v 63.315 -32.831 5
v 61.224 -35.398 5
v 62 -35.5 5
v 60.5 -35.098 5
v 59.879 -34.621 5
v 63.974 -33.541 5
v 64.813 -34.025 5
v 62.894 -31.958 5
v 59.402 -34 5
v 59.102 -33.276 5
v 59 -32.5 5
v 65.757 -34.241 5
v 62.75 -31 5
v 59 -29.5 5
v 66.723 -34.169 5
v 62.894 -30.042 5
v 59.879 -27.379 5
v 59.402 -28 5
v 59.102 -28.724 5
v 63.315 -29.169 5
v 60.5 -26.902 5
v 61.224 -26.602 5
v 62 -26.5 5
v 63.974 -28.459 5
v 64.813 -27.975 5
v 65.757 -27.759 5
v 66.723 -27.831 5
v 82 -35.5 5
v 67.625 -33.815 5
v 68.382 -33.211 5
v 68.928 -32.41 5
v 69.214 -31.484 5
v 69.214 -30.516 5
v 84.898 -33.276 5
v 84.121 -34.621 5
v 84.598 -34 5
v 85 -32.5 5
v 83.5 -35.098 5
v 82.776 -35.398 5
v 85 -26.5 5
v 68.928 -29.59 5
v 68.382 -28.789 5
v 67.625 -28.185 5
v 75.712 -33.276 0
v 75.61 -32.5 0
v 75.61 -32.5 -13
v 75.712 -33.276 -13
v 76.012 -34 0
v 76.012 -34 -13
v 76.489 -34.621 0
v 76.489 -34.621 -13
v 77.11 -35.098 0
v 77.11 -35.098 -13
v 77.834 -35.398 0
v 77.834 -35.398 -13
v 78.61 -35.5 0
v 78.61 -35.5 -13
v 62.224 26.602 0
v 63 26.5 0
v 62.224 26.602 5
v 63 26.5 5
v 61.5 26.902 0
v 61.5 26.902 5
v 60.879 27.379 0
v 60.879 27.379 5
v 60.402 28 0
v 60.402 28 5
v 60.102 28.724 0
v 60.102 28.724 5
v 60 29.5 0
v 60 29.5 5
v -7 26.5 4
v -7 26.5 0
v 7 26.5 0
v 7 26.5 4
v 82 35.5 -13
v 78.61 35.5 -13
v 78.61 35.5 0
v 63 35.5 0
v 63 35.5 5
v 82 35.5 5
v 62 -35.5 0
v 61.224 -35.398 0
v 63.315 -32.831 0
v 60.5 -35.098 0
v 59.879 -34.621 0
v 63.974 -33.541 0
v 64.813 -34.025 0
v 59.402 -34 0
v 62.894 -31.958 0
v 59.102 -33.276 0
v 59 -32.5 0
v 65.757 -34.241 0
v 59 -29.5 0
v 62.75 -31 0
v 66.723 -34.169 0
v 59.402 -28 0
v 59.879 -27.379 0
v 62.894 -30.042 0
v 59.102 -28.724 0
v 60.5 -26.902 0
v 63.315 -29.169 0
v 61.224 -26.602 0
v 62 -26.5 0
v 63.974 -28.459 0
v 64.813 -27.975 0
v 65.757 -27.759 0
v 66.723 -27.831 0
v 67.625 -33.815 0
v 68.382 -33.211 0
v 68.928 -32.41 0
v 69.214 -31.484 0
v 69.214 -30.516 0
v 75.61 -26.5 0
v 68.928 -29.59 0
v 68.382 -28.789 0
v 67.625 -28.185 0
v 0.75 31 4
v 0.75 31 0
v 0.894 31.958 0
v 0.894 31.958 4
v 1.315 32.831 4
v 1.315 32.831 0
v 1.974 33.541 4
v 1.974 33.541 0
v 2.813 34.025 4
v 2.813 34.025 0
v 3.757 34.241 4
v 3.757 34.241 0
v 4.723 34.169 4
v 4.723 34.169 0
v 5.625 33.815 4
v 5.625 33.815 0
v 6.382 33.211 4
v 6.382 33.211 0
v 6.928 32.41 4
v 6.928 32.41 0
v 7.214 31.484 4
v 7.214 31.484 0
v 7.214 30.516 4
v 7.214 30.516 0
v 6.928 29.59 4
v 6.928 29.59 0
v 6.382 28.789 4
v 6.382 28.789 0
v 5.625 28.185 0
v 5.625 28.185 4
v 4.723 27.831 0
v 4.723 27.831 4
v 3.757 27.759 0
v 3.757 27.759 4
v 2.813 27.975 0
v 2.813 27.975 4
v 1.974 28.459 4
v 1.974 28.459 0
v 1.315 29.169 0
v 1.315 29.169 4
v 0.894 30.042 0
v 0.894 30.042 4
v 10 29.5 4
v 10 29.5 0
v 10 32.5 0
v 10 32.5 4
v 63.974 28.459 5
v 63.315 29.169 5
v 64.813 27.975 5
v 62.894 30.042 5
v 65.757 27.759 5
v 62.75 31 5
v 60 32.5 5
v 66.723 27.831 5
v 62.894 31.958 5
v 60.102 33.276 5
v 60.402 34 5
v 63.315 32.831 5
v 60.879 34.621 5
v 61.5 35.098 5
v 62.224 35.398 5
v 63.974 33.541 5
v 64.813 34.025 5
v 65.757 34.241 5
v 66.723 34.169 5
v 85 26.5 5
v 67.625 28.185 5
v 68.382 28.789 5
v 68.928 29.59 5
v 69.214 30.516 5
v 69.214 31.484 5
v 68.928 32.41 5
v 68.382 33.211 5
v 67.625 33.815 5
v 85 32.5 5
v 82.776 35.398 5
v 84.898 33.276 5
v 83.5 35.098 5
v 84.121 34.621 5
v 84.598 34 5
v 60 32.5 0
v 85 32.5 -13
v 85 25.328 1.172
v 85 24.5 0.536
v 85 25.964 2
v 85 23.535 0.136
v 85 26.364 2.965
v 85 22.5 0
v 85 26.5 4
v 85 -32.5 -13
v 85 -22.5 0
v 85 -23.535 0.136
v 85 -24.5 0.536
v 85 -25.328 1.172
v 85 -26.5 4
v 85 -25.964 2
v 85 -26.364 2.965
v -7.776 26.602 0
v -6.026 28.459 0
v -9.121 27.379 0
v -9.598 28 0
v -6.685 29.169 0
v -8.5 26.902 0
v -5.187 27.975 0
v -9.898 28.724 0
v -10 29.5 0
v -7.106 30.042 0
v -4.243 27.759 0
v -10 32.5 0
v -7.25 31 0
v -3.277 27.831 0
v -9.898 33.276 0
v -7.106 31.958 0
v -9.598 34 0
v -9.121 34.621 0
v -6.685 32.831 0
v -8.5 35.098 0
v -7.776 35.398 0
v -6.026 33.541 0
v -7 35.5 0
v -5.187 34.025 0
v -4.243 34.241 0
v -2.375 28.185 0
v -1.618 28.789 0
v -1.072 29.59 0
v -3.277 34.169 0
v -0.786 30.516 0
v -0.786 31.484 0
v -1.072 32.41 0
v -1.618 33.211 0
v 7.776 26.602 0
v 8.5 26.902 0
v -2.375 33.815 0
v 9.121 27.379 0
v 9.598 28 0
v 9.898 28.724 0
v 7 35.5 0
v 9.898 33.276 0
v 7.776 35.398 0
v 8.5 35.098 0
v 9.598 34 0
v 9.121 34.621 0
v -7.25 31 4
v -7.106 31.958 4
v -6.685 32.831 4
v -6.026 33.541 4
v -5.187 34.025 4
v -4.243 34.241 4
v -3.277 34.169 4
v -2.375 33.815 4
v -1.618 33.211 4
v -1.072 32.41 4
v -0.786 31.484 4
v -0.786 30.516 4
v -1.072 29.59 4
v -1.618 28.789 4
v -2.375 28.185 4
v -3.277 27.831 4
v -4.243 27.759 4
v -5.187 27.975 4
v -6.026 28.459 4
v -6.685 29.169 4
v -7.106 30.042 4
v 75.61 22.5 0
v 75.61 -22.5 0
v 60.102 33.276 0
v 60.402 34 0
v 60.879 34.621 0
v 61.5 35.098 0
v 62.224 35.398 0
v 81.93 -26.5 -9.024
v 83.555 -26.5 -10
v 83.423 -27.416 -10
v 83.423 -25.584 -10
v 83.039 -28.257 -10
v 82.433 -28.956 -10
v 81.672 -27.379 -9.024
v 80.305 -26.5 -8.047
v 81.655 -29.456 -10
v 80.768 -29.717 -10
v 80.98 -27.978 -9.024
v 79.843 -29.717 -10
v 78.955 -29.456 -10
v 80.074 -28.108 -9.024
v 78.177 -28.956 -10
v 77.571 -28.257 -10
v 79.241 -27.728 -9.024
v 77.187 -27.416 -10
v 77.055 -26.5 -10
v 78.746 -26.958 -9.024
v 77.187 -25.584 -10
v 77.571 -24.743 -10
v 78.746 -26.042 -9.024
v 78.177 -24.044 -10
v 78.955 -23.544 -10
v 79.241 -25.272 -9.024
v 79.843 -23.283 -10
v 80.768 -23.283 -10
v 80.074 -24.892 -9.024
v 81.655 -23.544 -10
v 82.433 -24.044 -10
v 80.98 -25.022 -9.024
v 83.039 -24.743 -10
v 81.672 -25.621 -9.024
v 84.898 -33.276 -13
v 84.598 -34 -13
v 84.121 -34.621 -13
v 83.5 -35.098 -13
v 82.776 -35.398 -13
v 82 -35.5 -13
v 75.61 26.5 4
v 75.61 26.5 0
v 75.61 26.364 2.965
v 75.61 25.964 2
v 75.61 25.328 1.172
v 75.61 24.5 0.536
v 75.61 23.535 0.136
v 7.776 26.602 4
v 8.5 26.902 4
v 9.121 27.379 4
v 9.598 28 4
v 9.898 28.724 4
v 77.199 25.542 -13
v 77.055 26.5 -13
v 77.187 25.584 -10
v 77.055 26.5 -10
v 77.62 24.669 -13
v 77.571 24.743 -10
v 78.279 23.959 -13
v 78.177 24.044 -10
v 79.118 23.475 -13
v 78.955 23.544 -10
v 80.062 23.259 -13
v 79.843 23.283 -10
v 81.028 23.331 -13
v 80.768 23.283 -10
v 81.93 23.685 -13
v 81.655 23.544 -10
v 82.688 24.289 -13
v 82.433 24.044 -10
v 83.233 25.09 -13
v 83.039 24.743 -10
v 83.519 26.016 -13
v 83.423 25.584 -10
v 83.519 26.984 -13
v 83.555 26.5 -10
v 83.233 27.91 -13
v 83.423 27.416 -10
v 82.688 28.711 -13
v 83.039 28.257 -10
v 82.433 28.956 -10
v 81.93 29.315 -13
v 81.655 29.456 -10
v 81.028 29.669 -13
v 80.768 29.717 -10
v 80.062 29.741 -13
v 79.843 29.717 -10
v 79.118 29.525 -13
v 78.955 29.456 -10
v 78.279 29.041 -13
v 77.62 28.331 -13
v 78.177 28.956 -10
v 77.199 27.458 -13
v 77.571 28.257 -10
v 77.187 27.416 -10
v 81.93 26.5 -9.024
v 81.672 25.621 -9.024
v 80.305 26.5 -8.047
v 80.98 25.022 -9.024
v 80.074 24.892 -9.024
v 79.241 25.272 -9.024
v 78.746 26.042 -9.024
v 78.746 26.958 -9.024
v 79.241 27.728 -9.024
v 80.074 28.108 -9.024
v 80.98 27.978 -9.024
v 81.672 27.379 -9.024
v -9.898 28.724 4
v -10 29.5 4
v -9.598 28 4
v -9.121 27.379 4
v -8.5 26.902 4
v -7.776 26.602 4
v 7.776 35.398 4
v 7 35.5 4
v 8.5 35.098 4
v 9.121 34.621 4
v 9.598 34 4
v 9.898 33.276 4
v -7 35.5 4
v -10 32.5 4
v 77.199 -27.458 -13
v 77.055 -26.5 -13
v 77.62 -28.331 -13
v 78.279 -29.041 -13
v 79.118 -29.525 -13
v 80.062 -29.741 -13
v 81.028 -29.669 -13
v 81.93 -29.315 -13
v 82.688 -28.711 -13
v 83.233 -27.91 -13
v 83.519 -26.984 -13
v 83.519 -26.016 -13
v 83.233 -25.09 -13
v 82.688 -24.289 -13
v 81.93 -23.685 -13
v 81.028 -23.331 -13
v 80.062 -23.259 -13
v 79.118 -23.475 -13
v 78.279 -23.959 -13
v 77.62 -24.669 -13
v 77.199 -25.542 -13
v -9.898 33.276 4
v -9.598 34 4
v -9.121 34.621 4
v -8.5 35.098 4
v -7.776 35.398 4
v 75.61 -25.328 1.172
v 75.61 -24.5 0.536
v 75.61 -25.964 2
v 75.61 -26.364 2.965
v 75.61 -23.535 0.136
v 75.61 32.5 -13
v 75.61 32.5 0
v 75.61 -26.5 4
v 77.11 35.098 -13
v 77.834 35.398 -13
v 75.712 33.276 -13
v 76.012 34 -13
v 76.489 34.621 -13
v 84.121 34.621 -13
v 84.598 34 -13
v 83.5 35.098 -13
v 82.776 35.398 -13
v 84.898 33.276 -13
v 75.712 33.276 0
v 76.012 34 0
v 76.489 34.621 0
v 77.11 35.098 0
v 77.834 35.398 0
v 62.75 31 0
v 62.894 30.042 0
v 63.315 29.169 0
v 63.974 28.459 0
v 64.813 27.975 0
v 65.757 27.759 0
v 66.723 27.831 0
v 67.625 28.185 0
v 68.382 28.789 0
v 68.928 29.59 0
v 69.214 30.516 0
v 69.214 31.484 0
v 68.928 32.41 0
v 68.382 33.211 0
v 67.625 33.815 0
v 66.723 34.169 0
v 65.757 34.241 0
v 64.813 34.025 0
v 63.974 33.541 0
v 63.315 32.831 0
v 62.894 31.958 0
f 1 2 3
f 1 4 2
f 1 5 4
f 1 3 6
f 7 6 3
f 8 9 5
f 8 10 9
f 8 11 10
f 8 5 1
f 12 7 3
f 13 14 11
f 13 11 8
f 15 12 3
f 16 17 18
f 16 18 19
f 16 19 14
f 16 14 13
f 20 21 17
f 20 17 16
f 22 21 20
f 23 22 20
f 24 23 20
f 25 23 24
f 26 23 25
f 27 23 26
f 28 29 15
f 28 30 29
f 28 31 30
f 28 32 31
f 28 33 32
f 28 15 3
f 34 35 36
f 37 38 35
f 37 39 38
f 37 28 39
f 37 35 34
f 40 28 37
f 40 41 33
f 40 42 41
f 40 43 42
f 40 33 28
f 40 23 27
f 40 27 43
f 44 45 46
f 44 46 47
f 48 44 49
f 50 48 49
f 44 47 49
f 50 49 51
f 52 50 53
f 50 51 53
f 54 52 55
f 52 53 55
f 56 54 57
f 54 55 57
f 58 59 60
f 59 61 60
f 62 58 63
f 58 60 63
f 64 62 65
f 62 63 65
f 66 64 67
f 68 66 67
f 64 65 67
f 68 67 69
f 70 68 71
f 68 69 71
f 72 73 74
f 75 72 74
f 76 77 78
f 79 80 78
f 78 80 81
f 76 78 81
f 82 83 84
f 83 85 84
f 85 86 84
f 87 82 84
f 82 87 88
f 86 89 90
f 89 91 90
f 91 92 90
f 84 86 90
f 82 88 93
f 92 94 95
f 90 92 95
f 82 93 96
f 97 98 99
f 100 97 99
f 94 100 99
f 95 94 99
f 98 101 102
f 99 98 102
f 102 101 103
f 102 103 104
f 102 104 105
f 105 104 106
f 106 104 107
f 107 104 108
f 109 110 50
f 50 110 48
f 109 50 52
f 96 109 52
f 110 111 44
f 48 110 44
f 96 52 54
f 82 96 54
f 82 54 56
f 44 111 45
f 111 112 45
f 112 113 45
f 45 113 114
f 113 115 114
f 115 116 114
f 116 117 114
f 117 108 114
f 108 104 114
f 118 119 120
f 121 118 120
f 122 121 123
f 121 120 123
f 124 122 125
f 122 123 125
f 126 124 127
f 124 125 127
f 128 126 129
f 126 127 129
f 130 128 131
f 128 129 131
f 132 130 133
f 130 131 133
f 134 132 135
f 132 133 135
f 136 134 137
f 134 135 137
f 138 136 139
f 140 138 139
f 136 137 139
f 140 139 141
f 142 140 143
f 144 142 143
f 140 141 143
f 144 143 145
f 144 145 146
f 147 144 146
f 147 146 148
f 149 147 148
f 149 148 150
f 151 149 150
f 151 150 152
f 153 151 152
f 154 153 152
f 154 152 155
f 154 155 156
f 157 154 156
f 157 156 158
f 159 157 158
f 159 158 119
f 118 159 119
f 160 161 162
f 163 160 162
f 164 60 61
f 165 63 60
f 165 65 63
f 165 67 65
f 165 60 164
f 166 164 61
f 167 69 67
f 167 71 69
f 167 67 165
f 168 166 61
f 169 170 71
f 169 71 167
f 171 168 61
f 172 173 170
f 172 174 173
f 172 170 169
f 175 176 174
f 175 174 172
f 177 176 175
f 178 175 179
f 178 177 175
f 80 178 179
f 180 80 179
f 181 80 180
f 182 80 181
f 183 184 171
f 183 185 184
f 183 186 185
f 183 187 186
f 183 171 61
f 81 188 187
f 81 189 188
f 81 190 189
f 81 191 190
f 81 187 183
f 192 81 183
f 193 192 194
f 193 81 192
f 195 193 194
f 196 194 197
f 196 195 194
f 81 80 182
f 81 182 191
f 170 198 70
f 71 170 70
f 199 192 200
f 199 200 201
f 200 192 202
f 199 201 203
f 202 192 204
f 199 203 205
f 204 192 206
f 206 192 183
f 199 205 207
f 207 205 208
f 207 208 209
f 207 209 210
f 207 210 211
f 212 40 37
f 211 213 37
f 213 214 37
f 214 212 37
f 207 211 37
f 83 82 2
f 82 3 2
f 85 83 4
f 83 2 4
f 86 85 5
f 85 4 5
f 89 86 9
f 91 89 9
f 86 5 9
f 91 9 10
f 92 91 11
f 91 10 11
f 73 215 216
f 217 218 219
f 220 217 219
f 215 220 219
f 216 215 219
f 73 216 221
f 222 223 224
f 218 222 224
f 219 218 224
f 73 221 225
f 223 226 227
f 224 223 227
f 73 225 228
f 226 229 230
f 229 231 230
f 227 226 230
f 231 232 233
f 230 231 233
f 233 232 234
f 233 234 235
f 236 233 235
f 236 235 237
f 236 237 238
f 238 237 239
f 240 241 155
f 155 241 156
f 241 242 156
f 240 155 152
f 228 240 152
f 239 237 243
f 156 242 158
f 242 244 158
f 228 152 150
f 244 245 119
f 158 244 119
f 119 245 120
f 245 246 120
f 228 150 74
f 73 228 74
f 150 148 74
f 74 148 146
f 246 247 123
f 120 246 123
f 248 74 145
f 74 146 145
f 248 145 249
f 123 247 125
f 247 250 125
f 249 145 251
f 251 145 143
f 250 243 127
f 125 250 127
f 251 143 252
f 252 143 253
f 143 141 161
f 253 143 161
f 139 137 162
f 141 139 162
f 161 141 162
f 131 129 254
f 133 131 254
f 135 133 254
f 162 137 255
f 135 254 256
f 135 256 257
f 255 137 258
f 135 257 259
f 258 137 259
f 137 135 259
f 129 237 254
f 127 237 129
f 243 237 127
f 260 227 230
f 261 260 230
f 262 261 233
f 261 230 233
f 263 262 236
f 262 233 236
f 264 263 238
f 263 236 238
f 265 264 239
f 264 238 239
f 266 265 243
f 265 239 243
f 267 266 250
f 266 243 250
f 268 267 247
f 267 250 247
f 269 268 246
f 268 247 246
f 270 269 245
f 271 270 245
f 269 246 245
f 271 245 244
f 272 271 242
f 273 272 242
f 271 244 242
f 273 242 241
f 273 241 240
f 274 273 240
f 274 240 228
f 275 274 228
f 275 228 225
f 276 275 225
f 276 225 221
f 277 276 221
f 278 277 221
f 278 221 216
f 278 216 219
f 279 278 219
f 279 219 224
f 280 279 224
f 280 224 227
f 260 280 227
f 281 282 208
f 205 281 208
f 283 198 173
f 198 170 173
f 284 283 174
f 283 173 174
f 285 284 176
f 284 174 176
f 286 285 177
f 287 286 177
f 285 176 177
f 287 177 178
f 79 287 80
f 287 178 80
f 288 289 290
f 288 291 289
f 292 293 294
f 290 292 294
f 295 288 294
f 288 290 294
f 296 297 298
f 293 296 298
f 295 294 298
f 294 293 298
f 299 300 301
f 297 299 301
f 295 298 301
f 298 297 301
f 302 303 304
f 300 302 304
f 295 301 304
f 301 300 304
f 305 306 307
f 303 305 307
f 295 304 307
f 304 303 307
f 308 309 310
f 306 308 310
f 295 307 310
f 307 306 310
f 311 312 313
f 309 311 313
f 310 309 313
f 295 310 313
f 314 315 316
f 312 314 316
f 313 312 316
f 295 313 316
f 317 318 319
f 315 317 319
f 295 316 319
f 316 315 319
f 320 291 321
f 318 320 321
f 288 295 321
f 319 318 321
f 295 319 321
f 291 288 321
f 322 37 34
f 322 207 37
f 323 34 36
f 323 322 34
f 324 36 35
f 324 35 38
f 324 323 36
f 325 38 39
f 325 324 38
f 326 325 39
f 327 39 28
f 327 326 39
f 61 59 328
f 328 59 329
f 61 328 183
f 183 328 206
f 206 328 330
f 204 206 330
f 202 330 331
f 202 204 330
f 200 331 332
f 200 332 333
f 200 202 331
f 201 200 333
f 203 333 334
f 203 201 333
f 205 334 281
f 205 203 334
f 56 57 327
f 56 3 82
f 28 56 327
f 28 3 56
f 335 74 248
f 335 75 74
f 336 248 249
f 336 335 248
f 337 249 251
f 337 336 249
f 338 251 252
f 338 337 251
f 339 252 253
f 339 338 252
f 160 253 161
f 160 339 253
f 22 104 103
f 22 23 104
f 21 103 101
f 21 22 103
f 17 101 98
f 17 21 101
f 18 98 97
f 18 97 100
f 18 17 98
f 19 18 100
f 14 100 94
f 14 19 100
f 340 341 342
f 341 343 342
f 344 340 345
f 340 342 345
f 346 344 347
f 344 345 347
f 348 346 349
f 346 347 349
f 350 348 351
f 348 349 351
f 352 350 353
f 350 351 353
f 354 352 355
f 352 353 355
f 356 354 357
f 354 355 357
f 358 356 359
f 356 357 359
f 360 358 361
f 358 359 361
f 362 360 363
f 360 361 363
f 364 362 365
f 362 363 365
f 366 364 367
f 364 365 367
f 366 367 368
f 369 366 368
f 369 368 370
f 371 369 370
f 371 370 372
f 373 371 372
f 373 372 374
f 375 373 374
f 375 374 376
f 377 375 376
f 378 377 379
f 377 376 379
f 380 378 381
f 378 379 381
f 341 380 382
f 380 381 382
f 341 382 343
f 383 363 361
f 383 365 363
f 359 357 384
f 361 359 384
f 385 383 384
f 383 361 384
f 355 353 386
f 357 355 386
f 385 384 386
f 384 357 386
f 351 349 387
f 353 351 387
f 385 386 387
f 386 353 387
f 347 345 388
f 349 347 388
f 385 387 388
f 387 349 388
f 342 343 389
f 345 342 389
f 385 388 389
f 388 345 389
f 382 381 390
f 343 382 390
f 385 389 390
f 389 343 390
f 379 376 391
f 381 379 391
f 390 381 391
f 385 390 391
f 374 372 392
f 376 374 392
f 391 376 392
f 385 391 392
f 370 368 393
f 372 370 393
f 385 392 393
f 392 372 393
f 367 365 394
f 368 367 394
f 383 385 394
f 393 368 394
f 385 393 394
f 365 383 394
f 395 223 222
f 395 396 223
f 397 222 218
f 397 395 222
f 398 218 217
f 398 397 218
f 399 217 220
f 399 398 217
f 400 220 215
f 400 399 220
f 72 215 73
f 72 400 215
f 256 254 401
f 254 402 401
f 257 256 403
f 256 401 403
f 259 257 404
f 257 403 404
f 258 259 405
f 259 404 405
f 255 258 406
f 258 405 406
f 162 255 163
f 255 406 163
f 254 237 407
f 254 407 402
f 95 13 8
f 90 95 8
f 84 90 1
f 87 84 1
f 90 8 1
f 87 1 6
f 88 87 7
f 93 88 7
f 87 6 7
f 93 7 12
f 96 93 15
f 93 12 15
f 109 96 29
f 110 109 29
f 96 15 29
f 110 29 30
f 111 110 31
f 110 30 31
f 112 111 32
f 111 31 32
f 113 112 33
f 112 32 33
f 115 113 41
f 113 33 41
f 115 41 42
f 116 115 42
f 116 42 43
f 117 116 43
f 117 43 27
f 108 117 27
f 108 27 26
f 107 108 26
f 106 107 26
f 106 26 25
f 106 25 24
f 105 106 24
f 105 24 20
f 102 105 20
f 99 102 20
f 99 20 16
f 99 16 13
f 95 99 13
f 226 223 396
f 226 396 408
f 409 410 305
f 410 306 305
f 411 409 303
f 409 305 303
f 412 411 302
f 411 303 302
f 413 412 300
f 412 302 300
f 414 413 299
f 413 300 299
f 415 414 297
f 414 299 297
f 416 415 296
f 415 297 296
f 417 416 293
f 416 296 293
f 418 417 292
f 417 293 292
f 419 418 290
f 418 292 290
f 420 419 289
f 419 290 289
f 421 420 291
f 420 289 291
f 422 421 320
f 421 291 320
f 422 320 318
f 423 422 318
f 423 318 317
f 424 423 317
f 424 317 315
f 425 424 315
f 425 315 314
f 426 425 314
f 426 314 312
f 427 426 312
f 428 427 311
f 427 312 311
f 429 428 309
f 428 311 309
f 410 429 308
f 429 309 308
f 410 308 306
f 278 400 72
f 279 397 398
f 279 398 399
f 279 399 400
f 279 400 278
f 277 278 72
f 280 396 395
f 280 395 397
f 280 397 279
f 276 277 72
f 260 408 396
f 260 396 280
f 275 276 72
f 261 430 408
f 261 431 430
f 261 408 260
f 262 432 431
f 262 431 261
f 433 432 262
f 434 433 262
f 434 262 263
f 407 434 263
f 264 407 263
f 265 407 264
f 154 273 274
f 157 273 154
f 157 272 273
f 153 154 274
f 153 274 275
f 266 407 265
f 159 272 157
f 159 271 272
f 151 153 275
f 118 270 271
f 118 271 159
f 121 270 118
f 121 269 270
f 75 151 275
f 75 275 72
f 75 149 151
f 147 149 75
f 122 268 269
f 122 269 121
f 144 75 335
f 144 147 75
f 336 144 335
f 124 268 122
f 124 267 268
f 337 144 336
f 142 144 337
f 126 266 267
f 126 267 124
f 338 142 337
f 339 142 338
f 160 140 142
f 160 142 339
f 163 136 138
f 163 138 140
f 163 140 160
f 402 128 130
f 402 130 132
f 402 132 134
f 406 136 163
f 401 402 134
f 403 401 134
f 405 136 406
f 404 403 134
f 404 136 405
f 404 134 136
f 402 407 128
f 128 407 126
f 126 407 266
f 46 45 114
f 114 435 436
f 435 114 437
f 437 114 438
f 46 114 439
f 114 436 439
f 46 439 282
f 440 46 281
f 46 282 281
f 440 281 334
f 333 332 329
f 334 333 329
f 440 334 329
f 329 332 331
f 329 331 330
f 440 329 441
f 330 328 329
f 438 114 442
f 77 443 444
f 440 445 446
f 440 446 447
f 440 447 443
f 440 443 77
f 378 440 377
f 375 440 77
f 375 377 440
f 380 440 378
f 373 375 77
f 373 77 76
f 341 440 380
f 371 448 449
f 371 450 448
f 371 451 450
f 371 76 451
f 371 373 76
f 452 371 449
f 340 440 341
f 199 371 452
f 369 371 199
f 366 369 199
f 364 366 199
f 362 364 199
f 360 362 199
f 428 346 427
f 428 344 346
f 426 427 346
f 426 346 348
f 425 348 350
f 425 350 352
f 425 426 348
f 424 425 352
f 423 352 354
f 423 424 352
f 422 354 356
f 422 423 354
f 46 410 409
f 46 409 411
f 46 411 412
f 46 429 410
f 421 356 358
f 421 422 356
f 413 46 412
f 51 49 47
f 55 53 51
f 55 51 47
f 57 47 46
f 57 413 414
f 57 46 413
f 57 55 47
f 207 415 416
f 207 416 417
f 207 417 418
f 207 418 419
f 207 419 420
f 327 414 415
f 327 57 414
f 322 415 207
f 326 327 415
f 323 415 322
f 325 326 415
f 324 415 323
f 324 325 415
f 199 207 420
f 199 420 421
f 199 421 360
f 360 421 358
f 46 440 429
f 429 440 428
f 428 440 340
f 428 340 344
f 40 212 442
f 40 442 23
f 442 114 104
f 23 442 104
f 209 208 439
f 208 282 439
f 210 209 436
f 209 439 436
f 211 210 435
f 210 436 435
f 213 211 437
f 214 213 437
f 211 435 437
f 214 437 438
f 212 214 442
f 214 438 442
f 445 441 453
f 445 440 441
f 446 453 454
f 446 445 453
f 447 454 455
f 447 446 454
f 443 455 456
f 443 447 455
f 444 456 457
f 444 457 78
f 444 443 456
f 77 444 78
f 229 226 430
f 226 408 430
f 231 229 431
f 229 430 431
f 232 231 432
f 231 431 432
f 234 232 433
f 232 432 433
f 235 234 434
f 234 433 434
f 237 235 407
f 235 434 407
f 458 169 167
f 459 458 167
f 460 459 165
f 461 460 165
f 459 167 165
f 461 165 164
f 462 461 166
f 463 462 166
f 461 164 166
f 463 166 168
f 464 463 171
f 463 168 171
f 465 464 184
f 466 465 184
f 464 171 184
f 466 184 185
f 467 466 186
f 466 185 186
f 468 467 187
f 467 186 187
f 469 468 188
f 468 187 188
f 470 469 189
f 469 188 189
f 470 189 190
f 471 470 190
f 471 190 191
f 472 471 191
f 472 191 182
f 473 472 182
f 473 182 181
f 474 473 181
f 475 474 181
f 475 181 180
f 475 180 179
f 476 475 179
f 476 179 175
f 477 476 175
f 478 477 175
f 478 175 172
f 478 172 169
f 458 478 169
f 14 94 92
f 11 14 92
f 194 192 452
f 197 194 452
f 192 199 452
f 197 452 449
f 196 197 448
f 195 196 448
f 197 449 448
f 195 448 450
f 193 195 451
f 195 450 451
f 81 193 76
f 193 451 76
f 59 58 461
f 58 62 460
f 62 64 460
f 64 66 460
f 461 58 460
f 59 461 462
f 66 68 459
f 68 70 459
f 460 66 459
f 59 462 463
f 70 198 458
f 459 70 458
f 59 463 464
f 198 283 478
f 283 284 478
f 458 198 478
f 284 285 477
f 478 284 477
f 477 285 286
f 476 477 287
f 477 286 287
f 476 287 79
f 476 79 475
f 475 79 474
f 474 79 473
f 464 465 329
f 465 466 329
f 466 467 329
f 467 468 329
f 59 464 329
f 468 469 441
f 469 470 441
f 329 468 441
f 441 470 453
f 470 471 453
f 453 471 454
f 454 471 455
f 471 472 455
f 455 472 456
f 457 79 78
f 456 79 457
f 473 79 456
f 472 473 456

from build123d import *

# Parameters (mm, degrees)
F0_W      = 20
F0_H      = 9
F1_DEPTH  = 4
F3_D      = 6.5
F4_R      = 3
F6_DEPTH  = 5
F7_W      = 9.3898265034
F7_H      = 62
F7_H_2    = 9
F8_DEPTH  = 13
F10_R     = 4
F11_R     = 3
F12_D     = 6.5
F14_D     = 6.5
F14_DEPTH = 3
F14_TIP   = 1.9527970118


with BuildPart() as f1:
    # F0 (on Top) → F1 (new body)
    with BuildSketch(Plane.XY):
        with Locations((0, 31)):
            Rectangle(F0_W, F0_H)
    extrude(amount=F1_DEPTH)

    # F3 (through all)
    with Locations(Plane.XY.offset(4)):
        with Locations((-4, 31), (4, 31)):
            Hole(F3_D / 2)

    # F4
    f4_edges = [f1.edges().sort_by_distance(p)[0] for p in [
        (10, 35.5, 2),
        (10, 26.5, 2),
        (-10, 26.5, 2),
        (-10, 35.5, 2),
    ]]
    fillet(f4_edges, radius=F4_R)


with BuildPart() as f6:
    # F5 (on Top) → F6 (new body)
    with BuildSketch(Plane.XY):
        Polygon((60, 35.5), (60, 26.5), (75.6101734966, 26.5), (85, 26.5), (85, 35.5), (75.6101734966, 35.5), align=None)
    extrude(amount=F6_DEPTH)


with BuildPart() as f6b:
    # F5 (on Top) → F6, piece 2 (new body)
    with BuildSketch(Plane.XY):
        Polygon((59, -35.5), (75.6101734966, -35.5), (85, -35.5), (85, -26.5), (75.6101734966, -26.5), (59, -26.5), align=None)
    extrude(amount=F6_DEPTH)


with BuildPart() as f8:
    # F7 (on face) → F8 (new body)
    with BuildSketch(Plane(origin=(0, 0, 0), x_dir=(1, 0, 0), z_dir=(0, 0, -1))):
        with Locations((80.3050867483, -4.5)):
            Rectangle(F7_W, F7_H)
        with Locations((80.3050867483, 31)):
            Rectangle(F7_W, F7_H_2)
    extrude(amount=F8_DEPTH)


with BuildPart() as f6_1:
    add(f6.part)

    # F9: union F6b, F8
    add(f6b.part)
    add(f8.part)

    # F10
    f10_edges = [f6_1.edges().sort_by_distance(p)[0] for p in [
        (80.305087, 26.5, 0),
        (80.305087, -26.5, 0),
    ]]
    fillet(f10_edges, radius=F10_R)

    # F11
    f11_edges = [f6_1.edges().sort_by_distance(p)[0] for p in [
        (60, 26.5, 2.5),
        (60, 35.5, 2.5),
        (85, 35.5, -4),
        (85, -35.5, -4),
        (59, -35.5, 2.5),
        (59, -26.5, 2.5),
        (75.610173, 35.5, -6.5),
        (75.610173, -35.5, -6.5),
    ]]
    fillet(f11_edges, radius=F11_R)

    # F12 (through all)
    with Locations(Plane(origin=(0, 0, 0), x_dir=(1, 0, 0), z_dir=(0, 0, -1))):
        with Locations((66, -31), (66, 31)):
            Hole(F12_D / 2)

    # F14
    with Locations(Plane(origin=(0, 0, -13), x_dir=(1, 0, 0), z_dir=(0, 0, -1))):
        with Locations((80.3050867483, 26.5), (80.3050867483, -26.5)):
            Hole(F14_D / 2, depth=F14_DEPTH)
            with Locations((0, 0, -(F14_DEPTH + F14_TIP / 2))):  # 118° drill point
                Cone(0, F14_D / 2, F14_TIP, mode=Mode.SUBTRACT)


solid = Compound([f1.part, f6_1.part])
